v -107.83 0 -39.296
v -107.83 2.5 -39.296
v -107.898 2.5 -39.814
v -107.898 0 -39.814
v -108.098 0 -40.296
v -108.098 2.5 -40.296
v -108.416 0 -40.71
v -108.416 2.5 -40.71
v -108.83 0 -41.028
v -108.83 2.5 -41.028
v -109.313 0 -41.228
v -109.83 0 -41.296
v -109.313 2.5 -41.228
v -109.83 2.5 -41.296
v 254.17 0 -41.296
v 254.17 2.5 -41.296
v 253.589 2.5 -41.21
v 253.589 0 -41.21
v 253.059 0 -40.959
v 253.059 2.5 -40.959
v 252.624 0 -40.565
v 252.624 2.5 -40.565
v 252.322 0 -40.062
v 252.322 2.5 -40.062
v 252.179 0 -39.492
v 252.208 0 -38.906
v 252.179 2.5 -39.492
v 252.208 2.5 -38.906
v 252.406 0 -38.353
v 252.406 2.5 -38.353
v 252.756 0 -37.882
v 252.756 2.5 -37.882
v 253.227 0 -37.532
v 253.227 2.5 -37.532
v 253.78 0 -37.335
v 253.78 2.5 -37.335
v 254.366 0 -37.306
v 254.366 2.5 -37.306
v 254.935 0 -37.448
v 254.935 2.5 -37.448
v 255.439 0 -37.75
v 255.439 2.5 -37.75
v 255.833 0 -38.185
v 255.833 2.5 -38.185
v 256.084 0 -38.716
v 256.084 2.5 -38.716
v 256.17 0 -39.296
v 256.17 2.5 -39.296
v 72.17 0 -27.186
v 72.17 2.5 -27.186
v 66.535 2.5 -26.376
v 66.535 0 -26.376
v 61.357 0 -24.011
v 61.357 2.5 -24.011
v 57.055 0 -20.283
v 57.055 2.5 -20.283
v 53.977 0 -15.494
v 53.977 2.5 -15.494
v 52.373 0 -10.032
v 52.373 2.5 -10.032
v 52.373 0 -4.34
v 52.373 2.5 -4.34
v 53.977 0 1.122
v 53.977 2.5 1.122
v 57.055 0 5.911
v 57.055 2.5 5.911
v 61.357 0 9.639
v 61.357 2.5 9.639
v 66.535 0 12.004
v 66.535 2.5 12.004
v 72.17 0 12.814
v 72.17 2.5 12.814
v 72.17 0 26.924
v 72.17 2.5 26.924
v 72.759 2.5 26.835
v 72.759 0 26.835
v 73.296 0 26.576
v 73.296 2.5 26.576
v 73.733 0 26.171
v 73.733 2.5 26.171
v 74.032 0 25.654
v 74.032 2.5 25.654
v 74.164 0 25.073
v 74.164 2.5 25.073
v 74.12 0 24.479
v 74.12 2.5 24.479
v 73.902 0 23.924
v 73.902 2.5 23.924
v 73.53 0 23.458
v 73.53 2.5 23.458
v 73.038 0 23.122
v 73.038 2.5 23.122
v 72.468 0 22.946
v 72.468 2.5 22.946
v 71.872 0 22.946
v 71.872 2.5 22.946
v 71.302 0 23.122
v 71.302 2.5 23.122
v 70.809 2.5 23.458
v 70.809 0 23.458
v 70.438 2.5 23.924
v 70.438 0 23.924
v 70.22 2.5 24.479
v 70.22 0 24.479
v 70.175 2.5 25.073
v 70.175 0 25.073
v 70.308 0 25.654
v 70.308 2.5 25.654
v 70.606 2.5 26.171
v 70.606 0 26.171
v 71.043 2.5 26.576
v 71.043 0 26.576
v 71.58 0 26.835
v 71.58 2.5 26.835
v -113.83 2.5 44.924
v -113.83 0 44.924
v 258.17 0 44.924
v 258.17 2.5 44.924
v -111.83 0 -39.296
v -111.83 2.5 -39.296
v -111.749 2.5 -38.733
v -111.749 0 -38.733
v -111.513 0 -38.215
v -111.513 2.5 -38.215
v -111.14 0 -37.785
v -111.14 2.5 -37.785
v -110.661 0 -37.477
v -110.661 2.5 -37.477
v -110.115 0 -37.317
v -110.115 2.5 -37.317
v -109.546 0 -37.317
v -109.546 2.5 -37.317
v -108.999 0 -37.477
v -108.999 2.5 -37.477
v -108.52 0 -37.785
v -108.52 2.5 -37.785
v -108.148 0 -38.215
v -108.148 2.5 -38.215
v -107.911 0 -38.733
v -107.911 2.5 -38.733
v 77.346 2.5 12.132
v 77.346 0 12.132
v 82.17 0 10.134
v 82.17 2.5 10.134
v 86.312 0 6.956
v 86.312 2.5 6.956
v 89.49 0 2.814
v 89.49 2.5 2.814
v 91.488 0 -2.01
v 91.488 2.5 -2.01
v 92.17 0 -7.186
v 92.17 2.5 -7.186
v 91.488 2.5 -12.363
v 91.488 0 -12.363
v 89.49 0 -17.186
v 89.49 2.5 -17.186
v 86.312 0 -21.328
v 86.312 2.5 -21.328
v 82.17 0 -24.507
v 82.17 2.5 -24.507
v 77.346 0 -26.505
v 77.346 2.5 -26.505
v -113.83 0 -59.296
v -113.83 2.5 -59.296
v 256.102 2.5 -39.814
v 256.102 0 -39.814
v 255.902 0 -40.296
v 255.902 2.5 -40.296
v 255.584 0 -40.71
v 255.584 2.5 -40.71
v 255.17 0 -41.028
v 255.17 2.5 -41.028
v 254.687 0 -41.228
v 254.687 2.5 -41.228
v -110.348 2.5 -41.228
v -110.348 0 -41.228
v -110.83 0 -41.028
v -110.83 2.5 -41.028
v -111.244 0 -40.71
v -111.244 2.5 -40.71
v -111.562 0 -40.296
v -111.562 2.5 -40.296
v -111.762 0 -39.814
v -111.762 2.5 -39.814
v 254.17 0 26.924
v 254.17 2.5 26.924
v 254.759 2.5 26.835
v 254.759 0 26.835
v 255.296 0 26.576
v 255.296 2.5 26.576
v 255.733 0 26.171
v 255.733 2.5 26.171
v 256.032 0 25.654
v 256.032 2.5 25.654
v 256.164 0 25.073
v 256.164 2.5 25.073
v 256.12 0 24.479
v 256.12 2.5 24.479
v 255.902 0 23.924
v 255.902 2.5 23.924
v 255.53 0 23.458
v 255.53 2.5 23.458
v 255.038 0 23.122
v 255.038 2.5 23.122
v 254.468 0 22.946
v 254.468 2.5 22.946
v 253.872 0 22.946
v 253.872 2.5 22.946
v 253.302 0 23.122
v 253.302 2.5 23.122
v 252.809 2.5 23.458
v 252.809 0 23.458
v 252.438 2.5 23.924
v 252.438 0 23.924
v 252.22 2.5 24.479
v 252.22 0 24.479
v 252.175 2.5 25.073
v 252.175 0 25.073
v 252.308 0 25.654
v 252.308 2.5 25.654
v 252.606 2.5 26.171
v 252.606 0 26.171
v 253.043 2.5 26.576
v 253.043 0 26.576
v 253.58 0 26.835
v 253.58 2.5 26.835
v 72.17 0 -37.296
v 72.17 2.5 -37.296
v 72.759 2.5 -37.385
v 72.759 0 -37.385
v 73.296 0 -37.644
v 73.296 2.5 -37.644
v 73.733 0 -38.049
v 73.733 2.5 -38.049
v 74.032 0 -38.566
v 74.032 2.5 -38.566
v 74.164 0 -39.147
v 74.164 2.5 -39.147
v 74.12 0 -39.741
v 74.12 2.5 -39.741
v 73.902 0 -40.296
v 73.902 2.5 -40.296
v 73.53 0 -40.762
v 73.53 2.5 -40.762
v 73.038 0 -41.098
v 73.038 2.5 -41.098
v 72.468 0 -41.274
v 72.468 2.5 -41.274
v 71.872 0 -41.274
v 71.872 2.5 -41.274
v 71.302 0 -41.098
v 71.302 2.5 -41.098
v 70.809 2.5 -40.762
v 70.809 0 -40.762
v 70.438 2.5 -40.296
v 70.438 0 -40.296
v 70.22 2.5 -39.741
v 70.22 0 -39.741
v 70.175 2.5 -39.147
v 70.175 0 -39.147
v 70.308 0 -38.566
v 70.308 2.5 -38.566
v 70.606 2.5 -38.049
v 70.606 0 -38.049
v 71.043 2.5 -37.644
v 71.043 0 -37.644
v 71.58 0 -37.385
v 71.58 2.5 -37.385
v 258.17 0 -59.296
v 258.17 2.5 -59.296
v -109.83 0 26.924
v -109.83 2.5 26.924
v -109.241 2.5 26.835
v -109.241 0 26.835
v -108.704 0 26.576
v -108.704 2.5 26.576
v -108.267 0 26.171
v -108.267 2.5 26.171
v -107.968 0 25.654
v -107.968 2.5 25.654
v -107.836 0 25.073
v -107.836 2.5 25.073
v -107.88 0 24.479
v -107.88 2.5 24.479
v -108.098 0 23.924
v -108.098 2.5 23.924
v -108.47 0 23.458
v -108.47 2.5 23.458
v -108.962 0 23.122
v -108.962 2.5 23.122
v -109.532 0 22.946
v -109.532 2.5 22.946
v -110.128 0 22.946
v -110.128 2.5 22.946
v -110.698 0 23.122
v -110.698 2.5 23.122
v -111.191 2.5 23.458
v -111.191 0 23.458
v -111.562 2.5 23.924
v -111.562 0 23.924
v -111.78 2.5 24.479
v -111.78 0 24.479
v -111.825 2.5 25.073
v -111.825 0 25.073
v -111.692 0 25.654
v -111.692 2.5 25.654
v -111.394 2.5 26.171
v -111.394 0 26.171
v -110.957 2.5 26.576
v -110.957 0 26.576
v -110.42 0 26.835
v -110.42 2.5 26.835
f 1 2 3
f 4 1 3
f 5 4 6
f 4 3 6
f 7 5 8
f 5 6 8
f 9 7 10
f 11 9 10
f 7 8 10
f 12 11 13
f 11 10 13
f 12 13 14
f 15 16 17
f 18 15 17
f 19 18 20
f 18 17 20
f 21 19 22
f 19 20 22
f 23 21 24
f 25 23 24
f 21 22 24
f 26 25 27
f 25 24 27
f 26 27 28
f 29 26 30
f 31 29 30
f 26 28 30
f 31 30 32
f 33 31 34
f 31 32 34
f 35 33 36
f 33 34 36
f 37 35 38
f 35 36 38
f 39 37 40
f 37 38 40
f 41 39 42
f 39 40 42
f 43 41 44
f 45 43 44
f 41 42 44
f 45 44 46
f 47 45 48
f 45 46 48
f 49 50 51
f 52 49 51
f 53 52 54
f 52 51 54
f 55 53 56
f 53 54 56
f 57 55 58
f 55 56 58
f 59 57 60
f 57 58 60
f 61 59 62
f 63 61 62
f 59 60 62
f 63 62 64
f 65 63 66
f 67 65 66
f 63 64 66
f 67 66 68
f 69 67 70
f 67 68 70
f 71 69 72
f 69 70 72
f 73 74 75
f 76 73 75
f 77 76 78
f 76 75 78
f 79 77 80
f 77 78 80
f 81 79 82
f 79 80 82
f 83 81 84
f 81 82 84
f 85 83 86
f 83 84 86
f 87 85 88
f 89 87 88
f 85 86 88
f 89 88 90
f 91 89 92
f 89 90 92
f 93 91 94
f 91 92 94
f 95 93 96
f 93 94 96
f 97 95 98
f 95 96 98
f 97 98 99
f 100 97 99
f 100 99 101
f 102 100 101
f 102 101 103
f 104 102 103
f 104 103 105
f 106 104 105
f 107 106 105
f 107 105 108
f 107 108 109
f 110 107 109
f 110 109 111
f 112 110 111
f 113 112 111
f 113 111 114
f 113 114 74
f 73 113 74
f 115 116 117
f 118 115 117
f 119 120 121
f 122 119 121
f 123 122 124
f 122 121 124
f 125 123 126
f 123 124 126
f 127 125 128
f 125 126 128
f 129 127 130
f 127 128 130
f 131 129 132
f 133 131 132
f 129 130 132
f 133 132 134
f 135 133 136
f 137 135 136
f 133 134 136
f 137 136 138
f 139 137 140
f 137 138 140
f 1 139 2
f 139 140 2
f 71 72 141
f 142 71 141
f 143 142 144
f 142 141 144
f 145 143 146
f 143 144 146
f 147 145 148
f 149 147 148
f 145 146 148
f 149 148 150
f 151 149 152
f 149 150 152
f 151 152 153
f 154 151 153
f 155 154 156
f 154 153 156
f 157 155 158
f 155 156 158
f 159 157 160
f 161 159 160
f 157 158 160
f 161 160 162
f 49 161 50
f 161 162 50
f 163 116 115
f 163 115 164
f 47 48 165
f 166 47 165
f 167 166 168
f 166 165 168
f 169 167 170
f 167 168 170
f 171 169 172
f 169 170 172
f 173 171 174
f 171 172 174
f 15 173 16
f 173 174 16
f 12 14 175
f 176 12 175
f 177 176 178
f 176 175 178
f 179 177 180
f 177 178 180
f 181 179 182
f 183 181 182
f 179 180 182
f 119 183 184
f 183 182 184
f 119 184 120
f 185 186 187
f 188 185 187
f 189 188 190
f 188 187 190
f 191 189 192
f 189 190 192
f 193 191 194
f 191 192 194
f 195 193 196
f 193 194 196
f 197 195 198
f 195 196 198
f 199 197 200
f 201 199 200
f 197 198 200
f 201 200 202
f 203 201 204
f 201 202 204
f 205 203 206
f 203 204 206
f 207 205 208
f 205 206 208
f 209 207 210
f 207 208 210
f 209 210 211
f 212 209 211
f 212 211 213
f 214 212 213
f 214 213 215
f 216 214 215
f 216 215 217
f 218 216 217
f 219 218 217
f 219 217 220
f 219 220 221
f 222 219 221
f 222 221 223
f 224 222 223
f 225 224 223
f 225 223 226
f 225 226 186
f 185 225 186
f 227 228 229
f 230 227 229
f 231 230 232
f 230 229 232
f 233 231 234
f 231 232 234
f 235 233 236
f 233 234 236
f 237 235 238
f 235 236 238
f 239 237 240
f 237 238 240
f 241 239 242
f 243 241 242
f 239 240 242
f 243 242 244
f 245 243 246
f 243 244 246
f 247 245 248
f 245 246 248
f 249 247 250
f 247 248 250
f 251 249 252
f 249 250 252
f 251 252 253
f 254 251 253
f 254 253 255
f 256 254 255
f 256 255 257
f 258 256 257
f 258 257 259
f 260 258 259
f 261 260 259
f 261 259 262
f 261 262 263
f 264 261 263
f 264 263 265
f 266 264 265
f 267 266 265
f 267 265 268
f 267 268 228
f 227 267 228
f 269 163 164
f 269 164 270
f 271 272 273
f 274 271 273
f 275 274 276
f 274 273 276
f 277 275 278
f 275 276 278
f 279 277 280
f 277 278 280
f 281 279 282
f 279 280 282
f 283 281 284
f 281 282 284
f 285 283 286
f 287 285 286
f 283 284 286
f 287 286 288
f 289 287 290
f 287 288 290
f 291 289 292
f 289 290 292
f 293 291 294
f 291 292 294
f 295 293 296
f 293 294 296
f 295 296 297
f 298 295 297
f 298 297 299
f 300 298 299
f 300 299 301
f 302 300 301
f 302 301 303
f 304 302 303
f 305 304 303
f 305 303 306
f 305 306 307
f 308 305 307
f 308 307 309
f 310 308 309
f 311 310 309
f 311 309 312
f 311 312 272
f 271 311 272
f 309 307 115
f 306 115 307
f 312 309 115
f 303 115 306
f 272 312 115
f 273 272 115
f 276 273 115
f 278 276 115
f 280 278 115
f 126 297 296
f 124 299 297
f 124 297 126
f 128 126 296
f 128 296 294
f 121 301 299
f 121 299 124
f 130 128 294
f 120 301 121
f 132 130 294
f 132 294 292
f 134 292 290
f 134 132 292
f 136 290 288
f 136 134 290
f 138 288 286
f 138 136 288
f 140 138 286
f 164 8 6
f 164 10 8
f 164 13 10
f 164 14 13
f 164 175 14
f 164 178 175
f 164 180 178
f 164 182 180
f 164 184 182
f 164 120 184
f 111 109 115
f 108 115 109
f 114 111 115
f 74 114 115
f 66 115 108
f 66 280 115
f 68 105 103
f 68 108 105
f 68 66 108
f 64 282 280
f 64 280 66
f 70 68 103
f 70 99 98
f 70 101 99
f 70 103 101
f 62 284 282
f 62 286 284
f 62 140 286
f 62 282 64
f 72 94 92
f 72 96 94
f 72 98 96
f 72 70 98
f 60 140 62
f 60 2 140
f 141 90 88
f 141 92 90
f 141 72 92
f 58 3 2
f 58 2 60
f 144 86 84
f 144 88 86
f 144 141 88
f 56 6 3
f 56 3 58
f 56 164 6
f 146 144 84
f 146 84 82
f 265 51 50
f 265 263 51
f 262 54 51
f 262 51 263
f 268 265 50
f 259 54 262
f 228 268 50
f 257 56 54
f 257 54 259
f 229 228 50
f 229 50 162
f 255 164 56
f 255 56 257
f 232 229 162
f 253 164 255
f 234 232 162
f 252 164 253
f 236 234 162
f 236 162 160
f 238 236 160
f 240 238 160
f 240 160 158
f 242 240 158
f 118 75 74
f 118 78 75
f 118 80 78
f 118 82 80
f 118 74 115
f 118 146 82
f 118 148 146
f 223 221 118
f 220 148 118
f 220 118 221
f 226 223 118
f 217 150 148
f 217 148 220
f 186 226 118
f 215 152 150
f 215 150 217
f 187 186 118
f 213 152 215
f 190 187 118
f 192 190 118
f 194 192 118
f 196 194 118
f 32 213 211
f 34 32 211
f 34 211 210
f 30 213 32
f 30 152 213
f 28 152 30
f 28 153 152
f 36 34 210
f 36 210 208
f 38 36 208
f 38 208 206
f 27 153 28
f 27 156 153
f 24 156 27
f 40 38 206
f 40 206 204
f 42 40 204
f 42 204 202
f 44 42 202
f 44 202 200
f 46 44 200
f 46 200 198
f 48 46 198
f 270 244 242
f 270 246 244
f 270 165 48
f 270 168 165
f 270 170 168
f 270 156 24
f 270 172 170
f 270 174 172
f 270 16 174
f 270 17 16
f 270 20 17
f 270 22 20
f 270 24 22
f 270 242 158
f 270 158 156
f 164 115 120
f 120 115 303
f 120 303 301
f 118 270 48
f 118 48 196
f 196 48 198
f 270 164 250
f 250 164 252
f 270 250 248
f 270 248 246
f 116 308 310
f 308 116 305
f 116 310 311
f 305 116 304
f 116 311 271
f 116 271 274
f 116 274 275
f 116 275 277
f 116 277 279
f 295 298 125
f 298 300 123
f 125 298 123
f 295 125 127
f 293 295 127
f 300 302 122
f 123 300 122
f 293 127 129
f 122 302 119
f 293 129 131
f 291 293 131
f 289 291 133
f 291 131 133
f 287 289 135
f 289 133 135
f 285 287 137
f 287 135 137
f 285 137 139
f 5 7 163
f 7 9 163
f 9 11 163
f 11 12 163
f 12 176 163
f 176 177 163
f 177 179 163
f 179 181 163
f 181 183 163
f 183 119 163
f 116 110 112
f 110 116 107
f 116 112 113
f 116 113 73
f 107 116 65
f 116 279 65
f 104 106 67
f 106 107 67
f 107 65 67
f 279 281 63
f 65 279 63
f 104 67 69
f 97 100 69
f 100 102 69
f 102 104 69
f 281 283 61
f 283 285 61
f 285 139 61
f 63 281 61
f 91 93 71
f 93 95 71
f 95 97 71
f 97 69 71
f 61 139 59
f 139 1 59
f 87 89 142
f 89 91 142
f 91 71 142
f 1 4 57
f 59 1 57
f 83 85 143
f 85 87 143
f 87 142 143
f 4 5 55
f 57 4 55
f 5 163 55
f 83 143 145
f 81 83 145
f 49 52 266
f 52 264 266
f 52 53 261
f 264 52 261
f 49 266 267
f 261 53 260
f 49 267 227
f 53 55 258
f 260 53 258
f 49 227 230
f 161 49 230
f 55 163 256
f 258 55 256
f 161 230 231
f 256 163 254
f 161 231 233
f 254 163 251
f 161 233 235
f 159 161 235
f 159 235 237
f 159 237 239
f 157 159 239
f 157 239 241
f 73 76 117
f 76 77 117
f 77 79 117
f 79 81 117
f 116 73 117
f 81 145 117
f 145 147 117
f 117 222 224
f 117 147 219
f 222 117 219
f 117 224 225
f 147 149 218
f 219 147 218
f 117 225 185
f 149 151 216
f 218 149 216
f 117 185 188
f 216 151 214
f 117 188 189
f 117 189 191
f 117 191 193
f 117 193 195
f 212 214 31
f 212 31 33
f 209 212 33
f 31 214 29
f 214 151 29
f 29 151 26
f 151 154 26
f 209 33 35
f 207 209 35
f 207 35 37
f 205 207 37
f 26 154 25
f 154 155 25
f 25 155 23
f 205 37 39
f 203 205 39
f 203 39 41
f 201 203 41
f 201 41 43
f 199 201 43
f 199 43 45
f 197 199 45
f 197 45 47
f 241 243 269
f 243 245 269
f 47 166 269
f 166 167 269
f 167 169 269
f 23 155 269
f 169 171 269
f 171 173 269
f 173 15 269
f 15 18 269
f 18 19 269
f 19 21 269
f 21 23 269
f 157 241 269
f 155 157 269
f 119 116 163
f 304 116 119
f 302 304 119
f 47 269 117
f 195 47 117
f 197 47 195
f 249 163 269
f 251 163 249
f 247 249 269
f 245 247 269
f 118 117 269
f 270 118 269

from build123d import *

# Parameters (mm, degrees)
SKETCH1_W           = 372
SKETCH1_H           = 104.22
BOSS_EXTRUDE1_DEPTH = 2.5
SKETCH2_R           = 2
CUT_EXTRUDE1_DEPTH  = 10
SKETCH3_R           = 2
CUT_EXTRUDE2_DEPTH  = 10
CUT_EXTRUDE3_DEPTH  = 26


with BuildPart() as part:
    # Sketch1 → Boss-Extrude1 (new body)
    with BuildSketch(Plane(origin=(0, 0, 0), x_dir=(1, 0, 0), z_dir=(0, 1, 0))):
        with Locations((72.169818201, 7.186191072)):
            Rectangle(SKETCH1_W, SKETCH1_H)
    extrude(amount=BOSS_EXTRUDE1_DEPTH)

    # Sketch2 → Cut-Extrude1 (cut)
    with BuildSketch(Plane(origin=(0, 2.5, 0), x_dir=(1, 0, 0), z_dir=(0, 1, 0))):
        with BuildLine():
            ThreePointArc((-107.830181799, 39.296191072), (-108.415968237, 40.710404634), (-109.830181799, 41.296191072))
            Line((-109.830181799, 41.296191072), (-109.830181799, 39.296191072))
            Line((-109.830181799, 39.296191072), (-111.830181799, 39.296191072))
            ThreePointArc((-111.830181799, 39.296191072), (-109.830181799, 37.296191072), (-107.830181799, 39.296191072))
        make_face()
        with BuildLine():
            Line((-109.830181799, 39.296191072), (-109.830181799, 41.296191072))
            ThreePointArc((-109.830181799, 41.296191072), (-111.244395361, 40.710404634), (-111.830181799, 39.296191072))
            Line((-111.830181799, 39.296191072), (-109.830181799, 39.296191072))
        make_face()
        with BuildLine():
            ThreePointArc((256.169818201, 39.296191072), (255.584031763, 40.710404634), (254.169818201, 41.296191072))
            Line((254.169818201, 41.296191072), (254.169818201, 39.296191072))
            Line((254.169818201, 39.296191072), (256.169818201, 39.296191072))
        make_face()
        with BuildLine():
            Line((254.169818201, 39.296191072), (254.169818201, 41.296191072))
            ThreePointArc((254.169818201, 41.296191072), (252.755604639, 37.88197751), (256.169818201, 39.296191072))
            Line((256.169818201, 39.296191072), (254.169818201, 39.296191072))
        make_face()
        with Locations(Location((-109.830181799, -24.923808928, 0), (0, 0, 270))):
            Circle(SKETCH2_R)
        with Locations(Location((254.169818201, -24.923808928, 0), (0, 0, 270))):
            Circle(SKETCH2_R)
    extrude(amount=-CUT_EXTRUDE1_DEPTH, mode=Mode.SUBTRACT)

    # Sketch3 → Cut-Extrude2 (cut)
    with BuildSketch(Plane(origin=(0, 2.5, 0), x_dir=(1, 0, 0), z_dir=(0, 1, 0))):
        with Locations(Location((72.169818201, 39.296191072, 0), (0, 0, 270))):
            Circle(SKETCH3_R)
        with Locations(Location((72.169818201, -24.923808928, 0), (0, 0, 270))):
            Circle(SKETCH3_R)
    extrude(amount=-CUT_EXTRUDE2_DEPTH, mode=Mode.SUBTRACT)

    # Sketch4 → Cut-Extrude3 (cut)
    with BuildSketch(Plane(origin=(0, 2.5, 0), x_dir=(1, 0, 0), z_dir=(0, 1, 0))):
        with BuildLine():
            ThreePointArc((92.169818201, 7.186191072), (86.311953825, 21.328326696), (72.169818201, 27.186191072))
            Line((72.169818201, 27.186191072), (72.169818201, -12.813808928))
            ThreePointArc((72.169818201, -12.813808928), (86.311953825, -6.955944552), (92.169818201, 7.186191072))
        make_face()
        with BuildLine():
            Line((72.169818201, -12.813808928), (72.169818201, 27.186191072))
            ThreePointArc((72.169818201, 27.186191072), (52.169818201, 7.186191072), (72.169818201, -12.813808928))
        make_face()
    extrude(amount=-CUT_EXTRUDE3_DEPTH, mode=Mode.SUBTRACT)


solid = part.part
